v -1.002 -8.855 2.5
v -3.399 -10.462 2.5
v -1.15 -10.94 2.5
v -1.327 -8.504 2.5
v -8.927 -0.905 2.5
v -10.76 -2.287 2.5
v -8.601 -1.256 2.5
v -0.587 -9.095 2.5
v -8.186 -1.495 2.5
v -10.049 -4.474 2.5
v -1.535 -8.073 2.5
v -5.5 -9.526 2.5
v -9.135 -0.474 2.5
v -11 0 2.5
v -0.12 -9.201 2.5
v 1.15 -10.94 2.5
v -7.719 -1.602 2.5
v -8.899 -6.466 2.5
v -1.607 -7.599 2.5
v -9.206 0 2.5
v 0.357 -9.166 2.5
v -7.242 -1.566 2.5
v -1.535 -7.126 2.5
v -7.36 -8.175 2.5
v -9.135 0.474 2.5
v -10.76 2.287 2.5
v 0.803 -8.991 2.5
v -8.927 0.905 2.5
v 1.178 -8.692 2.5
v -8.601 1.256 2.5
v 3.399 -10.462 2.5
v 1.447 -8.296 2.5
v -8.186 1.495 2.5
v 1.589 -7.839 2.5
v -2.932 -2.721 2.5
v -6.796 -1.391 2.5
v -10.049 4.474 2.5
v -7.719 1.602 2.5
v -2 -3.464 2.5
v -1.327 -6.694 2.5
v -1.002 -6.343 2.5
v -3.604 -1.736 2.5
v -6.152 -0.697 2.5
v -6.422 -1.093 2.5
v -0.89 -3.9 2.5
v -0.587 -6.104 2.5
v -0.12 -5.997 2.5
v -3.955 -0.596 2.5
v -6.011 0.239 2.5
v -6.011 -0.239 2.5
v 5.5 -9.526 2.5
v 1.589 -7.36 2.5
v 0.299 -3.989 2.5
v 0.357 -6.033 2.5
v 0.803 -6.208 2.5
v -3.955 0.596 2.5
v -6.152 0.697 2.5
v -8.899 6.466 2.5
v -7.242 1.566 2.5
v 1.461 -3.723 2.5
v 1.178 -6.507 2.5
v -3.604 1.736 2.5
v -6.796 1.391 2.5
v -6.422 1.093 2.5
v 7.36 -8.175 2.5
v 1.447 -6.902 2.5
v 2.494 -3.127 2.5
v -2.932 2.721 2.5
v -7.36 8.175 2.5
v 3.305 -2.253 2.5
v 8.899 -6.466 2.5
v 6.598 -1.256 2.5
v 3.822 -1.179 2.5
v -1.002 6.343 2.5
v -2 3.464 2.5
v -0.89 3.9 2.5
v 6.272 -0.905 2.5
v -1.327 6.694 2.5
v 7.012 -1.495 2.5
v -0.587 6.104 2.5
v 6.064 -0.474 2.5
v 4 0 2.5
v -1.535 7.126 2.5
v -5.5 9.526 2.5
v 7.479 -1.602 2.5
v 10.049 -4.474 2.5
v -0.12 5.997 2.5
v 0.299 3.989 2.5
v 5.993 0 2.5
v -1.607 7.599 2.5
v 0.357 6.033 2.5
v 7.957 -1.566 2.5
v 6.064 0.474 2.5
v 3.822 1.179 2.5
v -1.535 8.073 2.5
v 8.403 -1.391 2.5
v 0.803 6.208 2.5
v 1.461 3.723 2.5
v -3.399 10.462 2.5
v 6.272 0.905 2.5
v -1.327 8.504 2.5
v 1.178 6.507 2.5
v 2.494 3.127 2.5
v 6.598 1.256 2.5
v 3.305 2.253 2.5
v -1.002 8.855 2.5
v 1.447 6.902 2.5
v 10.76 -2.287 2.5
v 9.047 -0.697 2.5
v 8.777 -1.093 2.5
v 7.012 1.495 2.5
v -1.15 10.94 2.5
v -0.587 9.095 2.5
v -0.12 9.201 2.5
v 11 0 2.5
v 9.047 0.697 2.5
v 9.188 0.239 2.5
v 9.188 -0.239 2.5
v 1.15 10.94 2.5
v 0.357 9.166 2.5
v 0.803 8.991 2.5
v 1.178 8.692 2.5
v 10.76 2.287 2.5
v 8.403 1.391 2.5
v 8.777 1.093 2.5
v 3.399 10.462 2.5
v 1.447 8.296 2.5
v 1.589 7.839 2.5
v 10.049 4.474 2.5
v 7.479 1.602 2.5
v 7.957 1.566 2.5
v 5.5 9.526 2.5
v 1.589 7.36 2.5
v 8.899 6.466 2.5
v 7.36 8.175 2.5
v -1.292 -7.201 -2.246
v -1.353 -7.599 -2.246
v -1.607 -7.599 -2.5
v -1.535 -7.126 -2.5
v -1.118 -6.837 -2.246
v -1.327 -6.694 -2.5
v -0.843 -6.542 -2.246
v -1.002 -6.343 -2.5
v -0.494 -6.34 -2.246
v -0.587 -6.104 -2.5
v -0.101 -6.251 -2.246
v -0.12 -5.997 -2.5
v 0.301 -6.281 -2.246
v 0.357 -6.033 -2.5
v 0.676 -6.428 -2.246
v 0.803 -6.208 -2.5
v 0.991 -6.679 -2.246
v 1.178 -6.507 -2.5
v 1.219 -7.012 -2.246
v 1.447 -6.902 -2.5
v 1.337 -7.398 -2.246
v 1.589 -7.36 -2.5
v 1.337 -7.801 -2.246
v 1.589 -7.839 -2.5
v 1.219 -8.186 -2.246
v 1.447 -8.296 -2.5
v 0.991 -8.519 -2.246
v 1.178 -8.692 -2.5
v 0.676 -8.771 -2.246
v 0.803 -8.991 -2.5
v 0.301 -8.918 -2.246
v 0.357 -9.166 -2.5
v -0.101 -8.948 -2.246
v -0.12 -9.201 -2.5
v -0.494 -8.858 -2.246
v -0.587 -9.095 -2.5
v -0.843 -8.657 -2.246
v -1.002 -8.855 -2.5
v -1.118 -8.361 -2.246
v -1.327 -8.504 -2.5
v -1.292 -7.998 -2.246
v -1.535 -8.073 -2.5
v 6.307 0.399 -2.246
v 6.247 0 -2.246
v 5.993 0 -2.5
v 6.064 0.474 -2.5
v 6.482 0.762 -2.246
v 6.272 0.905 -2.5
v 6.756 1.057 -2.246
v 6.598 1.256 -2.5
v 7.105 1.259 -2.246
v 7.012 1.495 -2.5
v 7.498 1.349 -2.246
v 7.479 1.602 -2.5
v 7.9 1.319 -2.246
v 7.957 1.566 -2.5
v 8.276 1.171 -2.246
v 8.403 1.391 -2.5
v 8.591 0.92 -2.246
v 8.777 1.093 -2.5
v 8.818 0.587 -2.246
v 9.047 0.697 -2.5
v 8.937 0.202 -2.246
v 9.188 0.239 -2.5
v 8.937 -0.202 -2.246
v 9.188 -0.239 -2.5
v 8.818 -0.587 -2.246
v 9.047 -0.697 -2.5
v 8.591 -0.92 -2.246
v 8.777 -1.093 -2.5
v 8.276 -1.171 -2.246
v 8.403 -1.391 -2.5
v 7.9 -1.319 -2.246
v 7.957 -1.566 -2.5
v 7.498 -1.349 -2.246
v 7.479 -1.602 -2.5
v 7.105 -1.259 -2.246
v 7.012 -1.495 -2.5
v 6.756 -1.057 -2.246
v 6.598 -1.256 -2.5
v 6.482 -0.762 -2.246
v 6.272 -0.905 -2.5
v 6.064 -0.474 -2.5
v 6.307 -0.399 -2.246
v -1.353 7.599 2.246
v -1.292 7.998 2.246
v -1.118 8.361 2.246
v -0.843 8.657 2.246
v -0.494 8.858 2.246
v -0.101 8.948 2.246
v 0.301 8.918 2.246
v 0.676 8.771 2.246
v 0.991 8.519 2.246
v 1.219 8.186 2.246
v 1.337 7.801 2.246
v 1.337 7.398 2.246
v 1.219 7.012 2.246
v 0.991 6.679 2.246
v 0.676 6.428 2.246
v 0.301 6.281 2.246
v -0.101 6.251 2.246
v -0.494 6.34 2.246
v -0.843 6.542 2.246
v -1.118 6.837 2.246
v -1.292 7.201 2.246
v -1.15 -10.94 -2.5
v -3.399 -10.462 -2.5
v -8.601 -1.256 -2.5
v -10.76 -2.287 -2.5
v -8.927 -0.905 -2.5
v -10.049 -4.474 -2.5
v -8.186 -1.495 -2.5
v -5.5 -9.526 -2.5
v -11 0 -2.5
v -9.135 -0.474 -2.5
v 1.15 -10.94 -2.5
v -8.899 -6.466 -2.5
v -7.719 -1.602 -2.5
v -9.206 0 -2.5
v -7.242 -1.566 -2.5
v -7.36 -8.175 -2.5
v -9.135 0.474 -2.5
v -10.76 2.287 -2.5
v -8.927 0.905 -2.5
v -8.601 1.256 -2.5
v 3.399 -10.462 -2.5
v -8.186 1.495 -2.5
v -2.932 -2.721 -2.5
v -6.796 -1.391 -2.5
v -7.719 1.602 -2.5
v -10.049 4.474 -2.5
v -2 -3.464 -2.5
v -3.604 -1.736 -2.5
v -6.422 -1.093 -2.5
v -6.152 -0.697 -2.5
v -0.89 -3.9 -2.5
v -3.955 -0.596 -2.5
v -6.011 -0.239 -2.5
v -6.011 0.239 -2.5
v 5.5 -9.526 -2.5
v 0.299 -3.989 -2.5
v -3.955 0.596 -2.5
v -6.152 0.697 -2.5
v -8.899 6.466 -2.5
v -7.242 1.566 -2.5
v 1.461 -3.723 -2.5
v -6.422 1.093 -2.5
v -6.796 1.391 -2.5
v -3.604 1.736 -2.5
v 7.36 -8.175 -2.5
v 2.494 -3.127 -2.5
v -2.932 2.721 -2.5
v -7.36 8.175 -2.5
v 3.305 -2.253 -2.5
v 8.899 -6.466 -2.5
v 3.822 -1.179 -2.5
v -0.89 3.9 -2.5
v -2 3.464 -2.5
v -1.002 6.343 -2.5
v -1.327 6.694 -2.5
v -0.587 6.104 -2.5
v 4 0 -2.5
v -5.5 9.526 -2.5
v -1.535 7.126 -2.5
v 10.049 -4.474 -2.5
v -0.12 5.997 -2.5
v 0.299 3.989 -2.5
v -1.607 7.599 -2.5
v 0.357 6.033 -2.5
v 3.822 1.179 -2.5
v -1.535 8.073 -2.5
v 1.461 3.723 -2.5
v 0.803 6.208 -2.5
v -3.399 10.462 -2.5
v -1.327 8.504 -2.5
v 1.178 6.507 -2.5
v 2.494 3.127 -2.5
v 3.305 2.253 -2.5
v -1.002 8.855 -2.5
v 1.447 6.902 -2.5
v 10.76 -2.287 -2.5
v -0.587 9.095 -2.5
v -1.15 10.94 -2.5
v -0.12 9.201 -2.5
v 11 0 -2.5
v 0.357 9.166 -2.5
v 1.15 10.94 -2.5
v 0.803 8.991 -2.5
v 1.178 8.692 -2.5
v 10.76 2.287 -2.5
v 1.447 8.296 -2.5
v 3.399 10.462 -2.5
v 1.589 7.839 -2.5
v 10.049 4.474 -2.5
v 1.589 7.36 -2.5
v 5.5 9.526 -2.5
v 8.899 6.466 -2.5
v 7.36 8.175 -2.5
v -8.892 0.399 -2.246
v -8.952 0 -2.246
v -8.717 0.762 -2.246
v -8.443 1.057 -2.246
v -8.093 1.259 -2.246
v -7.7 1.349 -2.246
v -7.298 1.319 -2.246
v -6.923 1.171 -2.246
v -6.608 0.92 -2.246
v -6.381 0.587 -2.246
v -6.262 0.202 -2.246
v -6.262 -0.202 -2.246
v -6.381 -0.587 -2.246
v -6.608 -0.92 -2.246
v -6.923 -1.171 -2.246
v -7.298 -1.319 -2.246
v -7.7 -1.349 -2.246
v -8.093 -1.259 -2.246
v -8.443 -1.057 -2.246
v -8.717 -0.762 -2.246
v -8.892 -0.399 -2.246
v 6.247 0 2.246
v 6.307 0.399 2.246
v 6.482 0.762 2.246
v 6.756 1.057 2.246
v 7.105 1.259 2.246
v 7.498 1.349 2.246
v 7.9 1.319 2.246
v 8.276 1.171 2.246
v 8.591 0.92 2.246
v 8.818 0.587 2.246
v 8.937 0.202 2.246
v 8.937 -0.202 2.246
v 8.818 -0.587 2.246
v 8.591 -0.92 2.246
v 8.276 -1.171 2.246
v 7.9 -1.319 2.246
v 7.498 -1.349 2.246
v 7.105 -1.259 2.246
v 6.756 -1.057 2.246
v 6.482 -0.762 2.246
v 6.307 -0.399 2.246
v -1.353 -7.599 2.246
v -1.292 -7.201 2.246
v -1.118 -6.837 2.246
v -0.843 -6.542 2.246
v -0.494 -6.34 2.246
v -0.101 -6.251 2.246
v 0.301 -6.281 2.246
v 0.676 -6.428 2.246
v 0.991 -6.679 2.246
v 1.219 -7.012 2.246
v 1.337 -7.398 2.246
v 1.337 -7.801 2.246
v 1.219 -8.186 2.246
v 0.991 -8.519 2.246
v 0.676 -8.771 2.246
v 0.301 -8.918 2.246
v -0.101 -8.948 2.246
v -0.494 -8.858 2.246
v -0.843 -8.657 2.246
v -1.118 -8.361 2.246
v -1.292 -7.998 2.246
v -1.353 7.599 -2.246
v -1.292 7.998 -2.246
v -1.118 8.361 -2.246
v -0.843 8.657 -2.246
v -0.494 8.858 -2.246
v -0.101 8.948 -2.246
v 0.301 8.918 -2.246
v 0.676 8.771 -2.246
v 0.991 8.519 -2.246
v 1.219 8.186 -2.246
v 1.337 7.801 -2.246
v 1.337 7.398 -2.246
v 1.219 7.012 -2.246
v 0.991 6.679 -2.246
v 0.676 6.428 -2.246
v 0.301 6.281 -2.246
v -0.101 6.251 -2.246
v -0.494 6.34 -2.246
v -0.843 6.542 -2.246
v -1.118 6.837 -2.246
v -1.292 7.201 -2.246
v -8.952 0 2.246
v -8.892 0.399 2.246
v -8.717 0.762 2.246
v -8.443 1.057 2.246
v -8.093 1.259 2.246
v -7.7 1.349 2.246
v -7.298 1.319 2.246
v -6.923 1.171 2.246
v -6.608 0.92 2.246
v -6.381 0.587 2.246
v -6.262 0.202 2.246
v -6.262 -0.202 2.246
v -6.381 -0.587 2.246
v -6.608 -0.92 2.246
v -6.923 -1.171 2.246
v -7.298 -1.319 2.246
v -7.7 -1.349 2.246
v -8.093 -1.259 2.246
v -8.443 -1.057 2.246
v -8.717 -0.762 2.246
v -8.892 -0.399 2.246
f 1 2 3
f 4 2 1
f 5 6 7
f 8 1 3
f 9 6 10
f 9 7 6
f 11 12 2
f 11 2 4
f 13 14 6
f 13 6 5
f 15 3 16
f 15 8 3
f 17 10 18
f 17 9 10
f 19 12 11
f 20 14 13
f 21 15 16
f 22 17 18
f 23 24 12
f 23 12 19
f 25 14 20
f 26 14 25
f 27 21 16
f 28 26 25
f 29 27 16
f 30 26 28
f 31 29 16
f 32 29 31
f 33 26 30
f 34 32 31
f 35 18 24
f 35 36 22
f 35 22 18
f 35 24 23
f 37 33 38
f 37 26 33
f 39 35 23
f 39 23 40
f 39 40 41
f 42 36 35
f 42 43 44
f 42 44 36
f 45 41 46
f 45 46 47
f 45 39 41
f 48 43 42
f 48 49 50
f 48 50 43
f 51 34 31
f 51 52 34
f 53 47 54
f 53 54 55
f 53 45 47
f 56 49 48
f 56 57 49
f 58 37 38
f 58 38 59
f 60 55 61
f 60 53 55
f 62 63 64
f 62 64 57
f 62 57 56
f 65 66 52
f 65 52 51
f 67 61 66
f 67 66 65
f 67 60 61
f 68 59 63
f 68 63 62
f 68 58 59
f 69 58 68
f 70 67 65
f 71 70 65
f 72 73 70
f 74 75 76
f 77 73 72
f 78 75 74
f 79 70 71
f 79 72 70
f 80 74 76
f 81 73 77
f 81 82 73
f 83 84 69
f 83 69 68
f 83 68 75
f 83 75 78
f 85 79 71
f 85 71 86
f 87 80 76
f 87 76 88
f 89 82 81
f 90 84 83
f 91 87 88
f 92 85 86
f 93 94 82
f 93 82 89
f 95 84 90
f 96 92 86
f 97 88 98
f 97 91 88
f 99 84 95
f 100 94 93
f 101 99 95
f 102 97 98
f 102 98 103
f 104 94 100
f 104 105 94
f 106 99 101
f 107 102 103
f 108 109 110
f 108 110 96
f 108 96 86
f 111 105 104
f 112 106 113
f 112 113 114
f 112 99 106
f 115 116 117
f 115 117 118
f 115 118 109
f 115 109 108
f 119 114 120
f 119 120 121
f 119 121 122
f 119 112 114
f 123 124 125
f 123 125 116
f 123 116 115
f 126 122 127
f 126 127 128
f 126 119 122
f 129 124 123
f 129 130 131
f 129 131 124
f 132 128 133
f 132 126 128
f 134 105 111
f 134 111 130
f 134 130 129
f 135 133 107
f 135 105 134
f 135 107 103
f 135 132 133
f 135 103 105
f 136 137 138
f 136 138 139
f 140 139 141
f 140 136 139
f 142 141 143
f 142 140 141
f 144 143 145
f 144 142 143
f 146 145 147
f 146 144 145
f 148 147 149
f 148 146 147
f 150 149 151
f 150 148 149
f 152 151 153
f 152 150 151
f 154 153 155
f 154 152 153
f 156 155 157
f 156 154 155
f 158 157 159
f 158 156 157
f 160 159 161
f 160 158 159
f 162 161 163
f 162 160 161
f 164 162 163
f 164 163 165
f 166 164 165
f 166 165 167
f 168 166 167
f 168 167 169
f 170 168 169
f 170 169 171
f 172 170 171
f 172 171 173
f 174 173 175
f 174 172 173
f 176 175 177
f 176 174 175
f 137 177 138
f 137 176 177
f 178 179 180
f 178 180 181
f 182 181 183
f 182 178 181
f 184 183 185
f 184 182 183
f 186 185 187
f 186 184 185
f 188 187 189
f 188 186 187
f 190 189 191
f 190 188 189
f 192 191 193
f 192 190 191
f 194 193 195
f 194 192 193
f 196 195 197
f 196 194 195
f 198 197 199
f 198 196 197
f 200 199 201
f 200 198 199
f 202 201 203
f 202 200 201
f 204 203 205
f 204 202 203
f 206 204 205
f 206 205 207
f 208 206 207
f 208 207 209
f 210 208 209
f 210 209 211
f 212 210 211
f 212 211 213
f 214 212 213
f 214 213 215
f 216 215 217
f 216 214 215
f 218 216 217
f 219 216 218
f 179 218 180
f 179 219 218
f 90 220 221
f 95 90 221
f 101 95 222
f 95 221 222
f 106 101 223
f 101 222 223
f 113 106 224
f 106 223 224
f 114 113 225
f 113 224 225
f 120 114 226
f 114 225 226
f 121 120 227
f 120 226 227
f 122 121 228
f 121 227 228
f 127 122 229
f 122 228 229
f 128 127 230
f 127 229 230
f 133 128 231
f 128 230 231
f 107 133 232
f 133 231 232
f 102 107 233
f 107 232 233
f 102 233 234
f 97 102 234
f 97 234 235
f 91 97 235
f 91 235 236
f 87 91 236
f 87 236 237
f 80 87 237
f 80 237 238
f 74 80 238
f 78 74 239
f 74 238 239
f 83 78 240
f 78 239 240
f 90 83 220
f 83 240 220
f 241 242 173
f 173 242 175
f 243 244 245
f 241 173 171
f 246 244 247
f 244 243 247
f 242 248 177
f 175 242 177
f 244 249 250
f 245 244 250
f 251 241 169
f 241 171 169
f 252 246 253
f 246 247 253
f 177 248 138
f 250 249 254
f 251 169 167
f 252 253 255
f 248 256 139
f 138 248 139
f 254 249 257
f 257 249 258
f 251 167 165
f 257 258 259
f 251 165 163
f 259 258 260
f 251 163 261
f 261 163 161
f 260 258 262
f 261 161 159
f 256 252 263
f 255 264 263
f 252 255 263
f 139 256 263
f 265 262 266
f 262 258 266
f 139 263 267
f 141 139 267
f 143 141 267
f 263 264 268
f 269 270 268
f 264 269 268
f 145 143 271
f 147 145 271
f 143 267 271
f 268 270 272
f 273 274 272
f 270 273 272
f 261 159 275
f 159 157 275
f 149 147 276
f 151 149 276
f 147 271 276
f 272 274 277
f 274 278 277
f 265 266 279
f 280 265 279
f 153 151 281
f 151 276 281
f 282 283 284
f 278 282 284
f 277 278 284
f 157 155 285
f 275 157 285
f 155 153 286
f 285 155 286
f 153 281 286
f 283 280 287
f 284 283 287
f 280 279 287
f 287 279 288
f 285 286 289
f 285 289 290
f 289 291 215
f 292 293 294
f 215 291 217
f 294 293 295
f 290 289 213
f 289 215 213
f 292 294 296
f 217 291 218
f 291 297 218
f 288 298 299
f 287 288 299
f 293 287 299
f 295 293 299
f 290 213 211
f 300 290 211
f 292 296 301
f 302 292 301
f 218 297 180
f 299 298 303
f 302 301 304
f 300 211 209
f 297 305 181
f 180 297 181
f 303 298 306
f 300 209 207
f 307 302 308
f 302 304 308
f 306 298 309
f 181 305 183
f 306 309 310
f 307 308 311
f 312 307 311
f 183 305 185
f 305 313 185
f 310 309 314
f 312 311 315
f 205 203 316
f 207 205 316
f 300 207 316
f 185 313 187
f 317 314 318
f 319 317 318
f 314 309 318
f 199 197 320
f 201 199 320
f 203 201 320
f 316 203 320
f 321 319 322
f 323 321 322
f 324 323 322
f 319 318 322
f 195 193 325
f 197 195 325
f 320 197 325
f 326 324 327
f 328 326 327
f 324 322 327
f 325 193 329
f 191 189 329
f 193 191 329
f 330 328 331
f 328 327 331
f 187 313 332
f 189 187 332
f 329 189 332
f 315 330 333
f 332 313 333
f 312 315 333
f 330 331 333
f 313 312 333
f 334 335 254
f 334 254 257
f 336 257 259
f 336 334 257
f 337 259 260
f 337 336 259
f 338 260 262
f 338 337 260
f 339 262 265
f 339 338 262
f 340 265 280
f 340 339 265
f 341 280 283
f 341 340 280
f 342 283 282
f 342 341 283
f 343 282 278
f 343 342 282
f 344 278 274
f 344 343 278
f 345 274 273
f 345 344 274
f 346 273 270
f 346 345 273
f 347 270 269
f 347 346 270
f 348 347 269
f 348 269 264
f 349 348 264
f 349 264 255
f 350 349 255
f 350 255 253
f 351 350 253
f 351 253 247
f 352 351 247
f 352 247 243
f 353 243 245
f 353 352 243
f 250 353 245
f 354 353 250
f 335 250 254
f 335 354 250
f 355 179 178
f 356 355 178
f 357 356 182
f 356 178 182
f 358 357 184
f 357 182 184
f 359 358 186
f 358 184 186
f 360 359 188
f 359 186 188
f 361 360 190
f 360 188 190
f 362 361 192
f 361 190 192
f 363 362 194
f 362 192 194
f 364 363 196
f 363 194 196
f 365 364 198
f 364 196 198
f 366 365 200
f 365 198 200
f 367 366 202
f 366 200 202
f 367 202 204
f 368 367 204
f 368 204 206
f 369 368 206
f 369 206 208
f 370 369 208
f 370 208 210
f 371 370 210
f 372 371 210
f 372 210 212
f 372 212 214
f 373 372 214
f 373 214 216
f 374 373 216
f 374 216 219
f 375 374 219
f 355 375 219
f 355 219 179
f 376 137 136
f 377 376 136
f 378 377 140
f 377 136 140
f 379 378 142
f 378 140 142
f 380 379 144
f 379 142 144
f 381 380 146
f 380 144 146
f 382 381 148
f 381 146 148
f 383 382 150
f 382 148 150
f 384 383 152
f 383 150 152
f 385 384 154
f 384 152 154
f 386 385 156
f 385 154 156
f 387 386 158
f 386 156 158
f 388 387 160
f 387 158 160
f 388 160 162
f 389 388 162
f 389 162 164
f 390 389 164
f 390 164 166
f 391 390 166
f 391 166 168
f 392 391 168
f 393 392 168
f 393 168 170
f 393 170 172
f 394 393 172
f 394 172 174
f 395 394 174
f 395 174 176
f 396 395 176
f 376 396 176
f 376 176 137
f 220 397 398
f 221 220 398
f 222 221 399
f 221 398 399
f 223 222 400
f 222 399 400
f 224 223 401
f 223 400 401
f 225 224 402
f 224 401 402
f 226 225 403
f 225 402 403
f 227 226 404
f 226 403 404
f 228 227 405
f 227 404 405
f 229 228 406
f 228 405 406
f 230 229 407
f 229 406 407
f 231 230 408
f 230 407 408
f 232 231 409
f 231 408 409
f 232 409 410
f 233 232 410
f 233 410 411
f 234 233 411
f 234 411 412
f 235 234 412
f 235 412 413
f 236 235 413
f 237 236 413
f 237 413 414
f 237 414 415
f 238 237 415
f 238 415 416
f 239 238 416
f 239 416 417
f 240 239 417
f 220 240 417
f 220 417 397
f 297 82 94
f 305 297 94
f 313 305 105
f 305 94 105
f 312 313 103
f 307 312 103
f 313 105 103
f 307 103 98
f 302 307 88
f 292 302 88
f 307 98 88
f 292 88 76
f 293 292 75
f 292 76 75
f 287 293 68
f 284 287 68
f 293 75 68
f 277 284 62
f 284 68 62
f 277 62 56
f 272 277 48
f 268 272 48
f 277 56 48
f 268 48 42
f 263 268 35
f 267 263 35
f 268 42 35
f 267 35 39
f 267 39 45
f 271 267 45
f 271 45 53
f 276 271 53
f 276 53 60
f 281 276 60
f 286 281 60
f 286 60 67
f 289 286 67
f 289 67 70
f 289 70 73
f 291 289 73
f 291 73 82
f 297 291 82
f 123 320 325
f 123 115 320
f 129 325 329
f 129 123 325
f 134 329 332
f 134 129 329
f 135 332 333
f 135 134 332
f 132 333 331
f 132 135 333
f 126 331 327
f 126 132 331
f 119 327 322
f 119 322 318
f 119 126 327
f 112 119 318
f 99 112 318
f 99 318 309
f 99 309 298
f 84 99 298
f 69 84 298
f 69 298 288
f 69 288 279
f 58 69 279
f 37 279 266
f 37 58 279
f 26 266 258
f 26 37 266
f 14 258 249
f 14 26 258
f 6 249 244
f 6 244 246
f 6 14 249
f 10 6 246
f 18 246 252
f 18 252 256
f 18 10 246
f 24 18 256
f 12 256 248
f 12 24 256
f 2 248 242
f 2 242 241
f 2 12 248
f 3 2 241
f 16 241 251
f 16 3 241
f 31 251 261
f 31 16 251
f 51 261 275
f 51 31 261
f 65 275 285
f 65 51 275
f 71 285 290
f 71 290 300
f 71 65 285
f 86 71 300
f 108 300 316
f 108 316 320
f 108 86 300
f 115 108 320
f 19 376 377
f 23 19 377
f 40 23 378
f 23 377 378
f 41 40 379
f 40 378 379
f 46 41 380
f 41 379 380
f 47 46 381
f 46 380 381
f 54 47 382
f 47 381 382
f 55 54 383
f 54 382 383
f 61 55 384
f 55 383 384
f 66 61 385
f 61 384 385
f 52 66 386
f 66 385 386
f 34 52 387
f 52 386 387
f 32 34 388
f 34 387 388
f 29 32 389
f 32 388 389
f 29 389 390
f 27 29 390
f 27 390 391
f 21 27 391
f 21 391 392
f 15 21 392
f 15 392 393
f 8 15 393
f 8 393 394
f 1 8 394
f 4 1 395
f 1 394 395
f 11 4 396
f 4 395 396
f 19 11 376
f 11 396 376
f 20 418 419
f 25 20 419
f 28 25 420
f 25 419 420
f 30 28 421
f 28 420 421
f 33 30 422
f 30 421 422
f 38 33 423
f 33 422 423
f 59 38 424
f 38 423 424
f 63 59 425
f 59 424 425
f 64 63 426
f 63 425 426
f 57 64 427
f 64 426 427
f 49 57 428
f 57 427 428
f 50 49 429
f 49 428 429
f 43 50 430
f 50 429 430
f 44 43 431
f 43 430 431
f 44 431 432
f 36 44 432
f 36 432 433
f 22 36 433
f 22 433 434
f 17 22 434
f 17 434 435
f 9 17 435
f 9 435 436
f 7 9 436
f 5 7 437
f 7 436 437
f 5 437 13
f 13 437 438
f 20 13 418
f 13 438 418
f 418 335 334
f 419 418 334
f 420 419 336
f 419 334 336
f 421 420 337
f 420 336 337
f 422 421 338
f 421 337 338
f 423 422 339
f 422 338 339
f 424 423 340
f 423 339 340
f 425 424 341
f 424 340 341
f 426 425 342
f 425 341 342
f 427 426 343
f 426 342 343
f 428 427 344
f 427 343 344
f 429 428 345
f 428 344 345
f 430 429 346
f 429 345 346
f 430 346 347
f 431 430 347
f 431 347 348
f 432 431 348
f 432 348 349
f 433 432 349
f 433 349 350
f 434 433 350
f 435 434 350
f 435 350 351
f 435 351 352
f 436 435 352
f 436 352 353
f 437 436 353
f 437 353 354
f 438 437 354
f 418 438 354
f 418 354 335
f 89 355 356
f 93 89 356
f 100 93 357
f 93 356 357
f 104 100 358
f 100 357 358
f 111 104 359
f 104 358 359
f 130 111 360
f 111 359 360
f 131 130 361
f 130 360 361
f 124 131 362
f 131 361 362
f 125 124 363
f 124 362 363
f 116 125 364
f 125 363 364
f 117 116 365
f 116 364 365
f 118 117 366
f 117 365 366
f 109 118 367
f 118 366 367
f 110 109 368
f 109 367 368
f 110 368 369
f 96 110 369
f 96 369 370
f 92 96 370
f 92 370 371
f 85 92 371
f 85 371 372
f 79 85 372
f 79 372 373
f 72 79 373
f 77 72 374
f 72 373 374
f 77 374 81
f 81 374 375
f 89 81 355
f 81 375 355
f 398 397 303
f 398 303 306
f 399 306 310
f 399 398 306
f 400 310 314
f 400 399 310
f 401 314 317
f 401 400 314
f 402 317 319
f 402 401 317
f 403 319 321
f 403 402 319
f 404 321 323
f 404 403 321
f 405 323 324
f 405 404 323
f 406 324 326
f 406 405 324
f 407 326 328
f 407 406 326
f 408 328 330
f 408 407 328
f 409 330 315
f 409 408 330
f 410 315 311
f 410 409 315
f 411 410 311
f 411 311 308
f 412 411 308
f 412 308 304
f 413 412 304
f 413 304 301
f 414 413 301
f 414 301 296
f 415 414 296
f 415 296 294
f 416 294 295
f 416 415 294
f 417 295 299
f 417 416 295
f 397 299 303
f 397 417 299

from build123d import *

# Parameters (mm, degrees)
SKETCH1_R             = 11
EXTRUDE1_DEPTH        = 2.5
F_6_32_TAPPED_HOLE3_D = 2.7051
CHAMFER1_SIZE         = 0.254
SKETCH2_R             = 4
EXTRUDE2_DEPTH        = 6


with BuildPart() as part:
    # Sketch1 → Extrude1 (new body, symmetric)
    with BuildSketch(Plane.XY):
        Circle(SKETCH1_R)
    extrude(amount=EXTRUDE1_DEPTH, both=True)

    # #6-32 Tapped Hole3 (through all)
    with Locations(Plane(origin=(0, 7.599342077, 2.5), x_dir=(1, 0, 0), z_dir=(0, 0, 1))):
        with Locations((0, 0), (-7.599342077, -7.599342077), (7.599342077, -7.599342077), (0, -15.198684154)):
            Hole(F_6_32_TAPPED_HOLE3_D / 2)

    # Chamfer1
    chamfer1_edges = [part.edges().sort_by_distance(p)[0] for p in [
        (8.951892077, 0, 2.5),
        (8.951892077, 0, -2.5),
        (-6.246792077, 0, 2.5),
        (-6.246792077, 0, -2.5),
        (1.35255, 7.599342077, 2.5),
        (1.35255, 7.599342077, -2.5),
        (1.35255, -7.599342077, 2.5),
        (1.35255, -7.599342077, -2.5),
    ]]
    chamfer(chamfer1_edges, length=CHAMFER1_SIZE)

    # Sketch2 → Extrude2 (cut, through all)
    with BuildSketch(Plane.XY.offset(2.5)):
        Circle(SKETCH2_R)
    extrude(amount=-EXTRUDE2_DEPTH, mode=Mode.SUBTRACT)


solid = part.part
